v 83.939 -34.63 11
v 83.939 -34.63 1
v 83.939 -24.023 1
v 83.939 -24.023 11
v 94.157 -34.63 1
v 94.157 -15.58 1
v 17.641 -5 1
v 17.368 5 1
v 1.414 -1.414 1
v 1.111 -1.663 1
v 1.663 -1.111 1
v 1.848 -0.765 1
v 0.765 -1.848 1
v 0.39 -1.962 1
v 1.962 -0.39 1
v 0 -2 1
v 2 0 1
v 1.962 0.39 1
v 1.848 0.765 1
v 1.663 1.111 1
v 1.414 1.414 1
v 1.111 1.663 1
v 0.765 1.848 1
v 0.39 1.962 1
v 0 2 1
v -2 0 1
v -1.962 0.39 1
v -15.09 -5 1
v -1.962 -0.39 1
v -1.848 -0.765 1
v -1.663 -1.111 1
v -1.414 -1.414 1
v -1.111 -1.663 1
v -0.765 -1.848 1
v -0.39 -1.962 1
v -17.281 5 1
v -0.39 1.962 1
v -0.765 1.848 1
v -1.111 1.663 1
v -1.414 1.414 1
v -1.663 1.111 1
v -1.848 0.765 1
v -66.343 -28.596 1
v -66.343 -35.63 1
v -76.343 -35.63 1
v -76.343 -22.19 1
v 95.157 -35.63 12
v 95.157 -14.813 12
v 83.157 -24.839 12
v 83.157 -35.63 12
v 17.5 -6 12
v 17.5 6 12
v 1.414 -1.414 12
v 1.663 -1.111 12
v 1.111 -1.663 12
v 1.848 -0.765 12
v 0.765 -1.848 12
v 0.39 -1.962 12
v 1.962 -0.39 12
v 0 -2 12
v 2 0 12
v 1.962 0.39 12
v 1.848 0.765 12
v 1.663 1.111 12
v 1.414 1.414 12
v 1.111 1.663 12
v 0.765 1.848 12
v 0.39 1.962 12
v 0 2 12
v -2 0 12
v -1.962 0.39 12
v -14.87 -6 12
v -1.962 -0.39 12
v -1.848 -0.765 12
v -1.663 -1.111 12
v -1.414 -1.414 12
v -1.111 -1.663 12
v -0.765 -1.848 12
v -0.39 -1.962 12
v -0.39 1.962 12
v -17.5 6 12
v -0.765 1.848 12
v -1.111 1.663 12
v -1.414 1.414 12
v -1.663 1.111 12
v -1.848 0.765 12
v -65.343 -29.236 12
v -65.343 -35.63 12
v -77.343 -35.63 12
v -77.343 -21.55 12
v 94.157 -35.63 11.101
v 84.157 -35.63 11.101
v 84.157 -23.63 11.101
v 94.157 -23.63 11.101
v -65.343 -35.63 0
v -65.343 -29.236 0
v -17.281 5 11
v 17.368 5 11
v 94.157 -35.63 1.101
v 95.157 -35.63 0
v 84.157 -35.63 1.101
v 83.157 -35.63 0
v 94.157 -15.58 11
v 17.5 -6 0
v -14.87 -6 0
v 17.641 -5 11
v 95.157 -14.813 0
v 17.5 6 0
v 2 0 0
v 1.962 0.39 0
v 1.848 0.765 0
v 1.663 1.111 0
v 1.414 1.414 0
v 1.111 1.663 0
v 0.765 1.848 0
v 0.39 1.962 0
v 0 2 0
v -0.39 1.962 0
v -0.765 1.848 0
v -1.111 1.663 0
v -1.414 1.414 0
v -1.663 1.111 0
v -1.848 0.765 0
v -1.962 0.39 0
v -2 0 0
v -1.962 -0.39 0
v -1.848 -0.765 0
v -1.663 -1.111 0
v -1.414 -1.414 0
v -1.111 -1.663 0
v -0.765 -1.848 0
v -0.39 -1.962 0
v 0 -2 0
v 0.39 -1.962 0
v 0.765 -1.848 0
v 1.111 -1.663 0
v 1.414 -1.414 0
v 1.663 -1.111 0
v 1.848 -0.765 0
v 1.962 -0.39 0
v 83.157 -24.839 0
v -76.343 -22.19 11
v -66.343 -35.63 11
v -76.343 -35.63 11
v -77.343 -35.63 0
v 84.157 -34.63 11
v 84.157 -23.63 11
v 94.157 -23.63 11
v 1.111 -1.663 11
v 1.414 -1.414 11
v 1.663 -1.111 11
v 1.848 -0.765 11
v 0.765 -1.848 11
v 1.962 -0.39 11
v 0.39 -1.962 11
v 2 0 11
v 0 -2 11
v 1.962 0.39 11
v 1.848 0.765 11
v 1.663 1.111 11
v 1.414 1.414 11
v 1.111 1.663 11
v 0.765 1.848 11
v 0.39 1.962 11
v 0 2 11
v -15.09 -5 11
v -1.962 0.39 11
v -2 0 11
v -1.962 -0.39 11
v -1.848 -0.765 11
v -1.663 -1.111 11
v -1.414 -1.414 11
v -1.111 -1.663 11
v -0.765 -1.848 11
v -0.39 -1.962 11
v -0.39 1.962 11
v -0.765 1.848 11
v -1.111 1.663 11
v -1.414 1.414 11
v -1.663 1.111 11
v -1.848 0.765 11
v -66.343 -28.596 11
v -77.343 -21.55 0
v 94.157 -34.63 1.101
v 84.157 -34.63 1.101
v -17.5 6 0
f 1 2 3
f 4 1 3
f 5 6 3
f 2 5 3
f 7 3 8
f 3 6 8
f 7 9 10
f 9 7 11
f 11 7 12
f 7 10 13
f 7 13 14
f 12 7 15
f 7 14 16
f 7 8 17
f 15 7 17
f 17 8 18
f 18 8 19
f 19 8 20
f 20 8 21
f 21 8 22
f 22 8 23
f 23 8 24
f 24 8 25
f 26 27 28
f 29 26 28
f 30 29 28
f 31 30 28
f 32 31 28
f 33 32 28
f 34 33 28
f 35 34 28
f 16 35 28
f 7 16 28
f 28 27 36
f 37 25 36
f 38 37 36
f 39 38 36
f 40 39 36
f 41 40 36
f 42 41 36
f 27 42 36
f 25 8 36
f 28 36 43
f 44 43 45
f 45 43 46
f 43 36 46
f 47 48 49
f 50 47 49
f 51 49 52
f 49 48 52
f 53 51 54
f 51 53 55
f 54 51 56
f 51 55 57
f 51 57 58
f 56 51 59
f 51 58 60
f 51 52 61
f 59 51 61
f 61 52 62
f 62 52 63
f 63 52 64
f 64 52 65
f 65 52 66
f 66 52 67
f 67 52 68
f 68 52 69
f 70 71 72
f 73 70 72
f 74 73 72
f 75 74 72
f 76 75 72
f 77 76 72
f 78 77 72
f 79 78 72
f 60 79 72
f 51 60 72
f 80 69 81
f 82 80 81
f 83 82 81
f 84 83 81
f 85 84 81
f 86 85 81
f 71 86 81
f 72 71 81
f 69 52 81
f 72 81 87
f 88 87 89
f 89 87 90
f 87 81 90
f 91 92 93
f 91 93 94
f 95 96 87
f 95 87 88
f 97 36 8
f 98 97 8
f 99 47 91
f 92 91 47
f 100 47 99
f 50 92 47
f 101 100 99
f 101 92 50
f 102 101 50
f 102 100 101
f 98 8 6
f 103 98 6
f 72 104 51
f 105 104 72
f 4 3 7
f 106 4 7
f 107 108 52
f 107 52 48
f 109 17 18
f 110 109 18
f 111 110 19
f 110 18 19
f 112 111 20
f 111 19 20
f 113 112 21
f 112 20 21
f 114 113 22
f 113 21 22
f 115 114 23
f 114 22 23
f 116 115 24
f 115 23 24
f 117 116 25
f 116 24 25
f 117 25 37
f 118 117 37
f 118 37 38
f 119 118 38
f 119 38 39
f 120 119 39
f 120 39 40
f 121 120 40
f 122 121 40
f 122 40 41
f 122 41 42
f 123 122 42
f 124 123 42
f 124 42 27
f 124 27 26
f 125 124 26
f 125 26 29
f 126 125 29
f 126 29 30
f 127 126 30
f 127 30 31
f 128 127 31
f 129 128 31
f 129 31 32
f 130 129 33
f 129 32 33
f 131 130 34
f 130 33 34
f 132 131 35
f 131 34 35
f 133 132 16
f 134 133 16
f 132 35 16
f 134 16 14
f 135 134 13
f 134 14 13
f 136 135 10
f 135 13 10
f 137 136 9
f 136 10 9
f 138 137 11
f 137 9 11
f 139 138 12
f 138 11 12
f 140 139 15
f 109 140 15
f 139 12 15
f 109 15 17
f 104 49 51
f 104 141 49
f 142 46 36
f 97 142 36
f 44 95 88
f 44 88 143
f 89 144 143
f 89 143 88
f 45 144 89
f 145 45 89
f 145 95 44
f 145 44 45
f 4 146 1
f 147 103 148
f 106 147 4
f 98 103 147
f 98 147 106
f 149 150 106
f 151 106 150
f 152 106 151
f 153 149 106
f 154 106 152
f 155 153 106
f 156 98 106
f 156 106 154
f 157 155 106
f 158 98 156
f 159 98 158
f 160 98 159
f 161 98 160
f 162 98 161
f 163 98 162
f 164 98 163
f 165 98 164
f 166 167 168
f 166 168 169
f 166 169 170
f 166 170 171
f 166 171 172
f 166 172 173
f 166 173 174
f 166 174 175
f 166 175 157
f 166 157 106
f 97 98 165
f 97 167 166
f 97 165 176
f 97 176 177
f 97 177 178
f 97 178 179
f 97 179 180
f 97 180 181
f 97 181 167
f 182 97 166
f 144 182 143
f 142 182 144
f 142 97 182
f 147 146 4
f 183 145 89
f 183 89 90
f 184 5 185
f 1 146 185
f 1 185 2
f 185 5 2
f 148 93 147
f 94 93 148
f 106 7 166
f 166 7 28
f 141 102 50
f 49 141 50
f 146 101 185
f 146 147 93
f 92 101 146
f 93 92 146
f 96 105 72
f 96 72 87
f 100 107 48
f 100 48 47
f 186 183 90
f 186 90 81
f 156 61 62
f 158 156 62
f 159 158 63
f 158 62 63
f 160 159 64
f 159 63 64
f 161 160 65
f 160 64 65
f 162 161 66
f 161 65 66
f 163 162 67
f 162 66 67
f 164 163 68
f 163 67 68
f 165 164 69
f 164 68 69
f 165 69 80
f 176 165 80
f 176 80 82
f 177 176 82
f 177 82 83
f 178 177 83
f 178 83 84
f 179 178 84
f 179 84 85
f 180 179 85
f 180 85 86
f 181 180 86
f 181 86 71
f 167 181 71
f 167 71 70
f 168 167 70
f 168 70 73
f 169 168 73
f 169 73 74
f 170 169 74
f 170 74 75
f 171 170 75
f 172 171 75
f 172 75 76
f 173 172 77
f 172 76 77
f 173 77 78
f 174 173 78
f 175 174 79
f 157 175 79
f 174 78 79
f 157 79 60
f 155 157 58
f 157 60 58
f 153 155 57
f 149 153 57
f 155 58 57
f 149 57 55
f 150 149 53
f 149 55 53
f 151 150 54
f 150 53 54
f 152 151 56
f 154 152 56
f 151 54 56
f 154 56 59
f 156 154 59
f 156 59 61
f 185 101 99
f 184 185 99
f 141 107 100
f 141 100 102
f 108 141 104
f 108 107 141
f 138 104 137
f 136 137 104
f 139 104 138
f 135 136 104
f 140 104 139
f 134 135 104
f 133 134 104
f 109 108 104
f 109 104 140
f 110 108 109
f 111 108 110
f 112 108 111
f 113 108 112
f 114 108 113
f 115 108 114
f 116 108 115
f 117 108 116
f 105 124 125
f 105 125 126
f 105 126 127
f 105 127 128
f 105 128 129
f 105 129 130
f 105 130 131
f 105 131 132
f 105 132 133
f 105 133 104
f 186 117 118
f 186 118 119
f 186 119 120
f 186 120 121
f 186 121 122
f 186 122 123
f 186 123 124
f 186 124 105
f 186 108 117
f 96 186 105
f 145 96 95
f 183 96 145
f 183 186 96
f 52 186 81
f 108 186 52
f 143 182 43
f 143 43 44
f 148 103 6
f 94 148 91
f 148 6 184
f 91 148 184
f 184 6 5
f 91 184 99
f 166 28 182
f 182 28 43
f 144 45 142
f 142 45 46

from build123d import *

# Parameters (mm, degrees)
BOSS_EXTRUDE1_DEPTH = 12
SHELL1_T            = -1
SKETCH2_W           = 10
SKETCH2_H           = 10
CUT_EXTRUDE1_DEPTH  = 12
SKETCH3_R           = 2
CUT_EXTRUDE2_DEPTH  = 12
CUT_EXTRUDE3_REACH  = 43.63
SKETCH5_W           = 0.21800788
SKETCH5_H           = 12


with BuildPart() as part:
    # Sketch1 → Boss-Extrude1 (new body)
    with BuildSketch(Plane.XY):
        Polygon((82.939086493, -35.63), (82.939086493, -24.776717085), (17.5, -6), (-14.870410096, -6), (-65.342905627, -29.23610302), (-65.342905627, -35.63), (-77.342905627, -35.63), (-77.342905627, -21.549973615), (-17.5, 6), (17.5, 6), (95.157094373, -14.812940234), (95.157094373, -35.63), align=None)
    extrude(amount=BOSS_EXTRUDE1_DEPTH)

    # Shell1
    shell1_openings = [part.faces().sort_by_distance(p)[0] for p in [
        (-71.342905627, -35.63, 6),
    ]]
    offset(amount=SHELL1_T, openings=shell1_openings, kind=Kind.INTERSECTION)

    # Sketch2 → Cut-Extrude1 (cut)
    with BuildSketch(Plane.XZ.offset(35.63)):
        with Locations((89.157094373, 6.101364163)):
            Rectangle(SKETCH2_W, SKETCH2_H)
    extrude(amount=-CUT_EXTRUDE1_DEPTH, mode=Mode.SUBTRACT)

    # Sketch3 → Cut-Extrude2 (cut)
    with BuildSketch(Plane.XY.offset(12)):
        Circle(SKETCH3_R)
    extrude(amount=-CUT_EXTRUDE2_DEPTH, mode=Mode.SUBTRACT)

    # Cut-Extrude3: up to this face of the body (flat: up to its plane)
    cut_extrude3_end = Plane(part.part.faces().sort_by_distance((50.219543247, -15.388358542, 6))[0])
    # Sketch5 → Cut-Extrude3 (cut, up to the picked face)
    with BuildSketch(Plane.XZ.offset(35.63), mode=Mode.PRIVATE) as cut_extrude3_sk1:
        with Locations((83.048090433, 6)):
            Rectangle(SKETCH5_W, SKETCH5_H)
    cut_extrude3_tool1 = split(extrude(cut_extrude3_sk1.sketch, amount=-CUT_EXTRUDE3_REACH, mode=Mode.PRIVATE), bisect_by=cut_extrude3_end, keep=Keep.BOTH, mode=Mode.PRIVATE)
    add(cut_extrude3_tool1.solids().sort_by_distance((83.04809, -35.63, 6))[0], mode=Mode.SUBTRACT)


solid = part.part
